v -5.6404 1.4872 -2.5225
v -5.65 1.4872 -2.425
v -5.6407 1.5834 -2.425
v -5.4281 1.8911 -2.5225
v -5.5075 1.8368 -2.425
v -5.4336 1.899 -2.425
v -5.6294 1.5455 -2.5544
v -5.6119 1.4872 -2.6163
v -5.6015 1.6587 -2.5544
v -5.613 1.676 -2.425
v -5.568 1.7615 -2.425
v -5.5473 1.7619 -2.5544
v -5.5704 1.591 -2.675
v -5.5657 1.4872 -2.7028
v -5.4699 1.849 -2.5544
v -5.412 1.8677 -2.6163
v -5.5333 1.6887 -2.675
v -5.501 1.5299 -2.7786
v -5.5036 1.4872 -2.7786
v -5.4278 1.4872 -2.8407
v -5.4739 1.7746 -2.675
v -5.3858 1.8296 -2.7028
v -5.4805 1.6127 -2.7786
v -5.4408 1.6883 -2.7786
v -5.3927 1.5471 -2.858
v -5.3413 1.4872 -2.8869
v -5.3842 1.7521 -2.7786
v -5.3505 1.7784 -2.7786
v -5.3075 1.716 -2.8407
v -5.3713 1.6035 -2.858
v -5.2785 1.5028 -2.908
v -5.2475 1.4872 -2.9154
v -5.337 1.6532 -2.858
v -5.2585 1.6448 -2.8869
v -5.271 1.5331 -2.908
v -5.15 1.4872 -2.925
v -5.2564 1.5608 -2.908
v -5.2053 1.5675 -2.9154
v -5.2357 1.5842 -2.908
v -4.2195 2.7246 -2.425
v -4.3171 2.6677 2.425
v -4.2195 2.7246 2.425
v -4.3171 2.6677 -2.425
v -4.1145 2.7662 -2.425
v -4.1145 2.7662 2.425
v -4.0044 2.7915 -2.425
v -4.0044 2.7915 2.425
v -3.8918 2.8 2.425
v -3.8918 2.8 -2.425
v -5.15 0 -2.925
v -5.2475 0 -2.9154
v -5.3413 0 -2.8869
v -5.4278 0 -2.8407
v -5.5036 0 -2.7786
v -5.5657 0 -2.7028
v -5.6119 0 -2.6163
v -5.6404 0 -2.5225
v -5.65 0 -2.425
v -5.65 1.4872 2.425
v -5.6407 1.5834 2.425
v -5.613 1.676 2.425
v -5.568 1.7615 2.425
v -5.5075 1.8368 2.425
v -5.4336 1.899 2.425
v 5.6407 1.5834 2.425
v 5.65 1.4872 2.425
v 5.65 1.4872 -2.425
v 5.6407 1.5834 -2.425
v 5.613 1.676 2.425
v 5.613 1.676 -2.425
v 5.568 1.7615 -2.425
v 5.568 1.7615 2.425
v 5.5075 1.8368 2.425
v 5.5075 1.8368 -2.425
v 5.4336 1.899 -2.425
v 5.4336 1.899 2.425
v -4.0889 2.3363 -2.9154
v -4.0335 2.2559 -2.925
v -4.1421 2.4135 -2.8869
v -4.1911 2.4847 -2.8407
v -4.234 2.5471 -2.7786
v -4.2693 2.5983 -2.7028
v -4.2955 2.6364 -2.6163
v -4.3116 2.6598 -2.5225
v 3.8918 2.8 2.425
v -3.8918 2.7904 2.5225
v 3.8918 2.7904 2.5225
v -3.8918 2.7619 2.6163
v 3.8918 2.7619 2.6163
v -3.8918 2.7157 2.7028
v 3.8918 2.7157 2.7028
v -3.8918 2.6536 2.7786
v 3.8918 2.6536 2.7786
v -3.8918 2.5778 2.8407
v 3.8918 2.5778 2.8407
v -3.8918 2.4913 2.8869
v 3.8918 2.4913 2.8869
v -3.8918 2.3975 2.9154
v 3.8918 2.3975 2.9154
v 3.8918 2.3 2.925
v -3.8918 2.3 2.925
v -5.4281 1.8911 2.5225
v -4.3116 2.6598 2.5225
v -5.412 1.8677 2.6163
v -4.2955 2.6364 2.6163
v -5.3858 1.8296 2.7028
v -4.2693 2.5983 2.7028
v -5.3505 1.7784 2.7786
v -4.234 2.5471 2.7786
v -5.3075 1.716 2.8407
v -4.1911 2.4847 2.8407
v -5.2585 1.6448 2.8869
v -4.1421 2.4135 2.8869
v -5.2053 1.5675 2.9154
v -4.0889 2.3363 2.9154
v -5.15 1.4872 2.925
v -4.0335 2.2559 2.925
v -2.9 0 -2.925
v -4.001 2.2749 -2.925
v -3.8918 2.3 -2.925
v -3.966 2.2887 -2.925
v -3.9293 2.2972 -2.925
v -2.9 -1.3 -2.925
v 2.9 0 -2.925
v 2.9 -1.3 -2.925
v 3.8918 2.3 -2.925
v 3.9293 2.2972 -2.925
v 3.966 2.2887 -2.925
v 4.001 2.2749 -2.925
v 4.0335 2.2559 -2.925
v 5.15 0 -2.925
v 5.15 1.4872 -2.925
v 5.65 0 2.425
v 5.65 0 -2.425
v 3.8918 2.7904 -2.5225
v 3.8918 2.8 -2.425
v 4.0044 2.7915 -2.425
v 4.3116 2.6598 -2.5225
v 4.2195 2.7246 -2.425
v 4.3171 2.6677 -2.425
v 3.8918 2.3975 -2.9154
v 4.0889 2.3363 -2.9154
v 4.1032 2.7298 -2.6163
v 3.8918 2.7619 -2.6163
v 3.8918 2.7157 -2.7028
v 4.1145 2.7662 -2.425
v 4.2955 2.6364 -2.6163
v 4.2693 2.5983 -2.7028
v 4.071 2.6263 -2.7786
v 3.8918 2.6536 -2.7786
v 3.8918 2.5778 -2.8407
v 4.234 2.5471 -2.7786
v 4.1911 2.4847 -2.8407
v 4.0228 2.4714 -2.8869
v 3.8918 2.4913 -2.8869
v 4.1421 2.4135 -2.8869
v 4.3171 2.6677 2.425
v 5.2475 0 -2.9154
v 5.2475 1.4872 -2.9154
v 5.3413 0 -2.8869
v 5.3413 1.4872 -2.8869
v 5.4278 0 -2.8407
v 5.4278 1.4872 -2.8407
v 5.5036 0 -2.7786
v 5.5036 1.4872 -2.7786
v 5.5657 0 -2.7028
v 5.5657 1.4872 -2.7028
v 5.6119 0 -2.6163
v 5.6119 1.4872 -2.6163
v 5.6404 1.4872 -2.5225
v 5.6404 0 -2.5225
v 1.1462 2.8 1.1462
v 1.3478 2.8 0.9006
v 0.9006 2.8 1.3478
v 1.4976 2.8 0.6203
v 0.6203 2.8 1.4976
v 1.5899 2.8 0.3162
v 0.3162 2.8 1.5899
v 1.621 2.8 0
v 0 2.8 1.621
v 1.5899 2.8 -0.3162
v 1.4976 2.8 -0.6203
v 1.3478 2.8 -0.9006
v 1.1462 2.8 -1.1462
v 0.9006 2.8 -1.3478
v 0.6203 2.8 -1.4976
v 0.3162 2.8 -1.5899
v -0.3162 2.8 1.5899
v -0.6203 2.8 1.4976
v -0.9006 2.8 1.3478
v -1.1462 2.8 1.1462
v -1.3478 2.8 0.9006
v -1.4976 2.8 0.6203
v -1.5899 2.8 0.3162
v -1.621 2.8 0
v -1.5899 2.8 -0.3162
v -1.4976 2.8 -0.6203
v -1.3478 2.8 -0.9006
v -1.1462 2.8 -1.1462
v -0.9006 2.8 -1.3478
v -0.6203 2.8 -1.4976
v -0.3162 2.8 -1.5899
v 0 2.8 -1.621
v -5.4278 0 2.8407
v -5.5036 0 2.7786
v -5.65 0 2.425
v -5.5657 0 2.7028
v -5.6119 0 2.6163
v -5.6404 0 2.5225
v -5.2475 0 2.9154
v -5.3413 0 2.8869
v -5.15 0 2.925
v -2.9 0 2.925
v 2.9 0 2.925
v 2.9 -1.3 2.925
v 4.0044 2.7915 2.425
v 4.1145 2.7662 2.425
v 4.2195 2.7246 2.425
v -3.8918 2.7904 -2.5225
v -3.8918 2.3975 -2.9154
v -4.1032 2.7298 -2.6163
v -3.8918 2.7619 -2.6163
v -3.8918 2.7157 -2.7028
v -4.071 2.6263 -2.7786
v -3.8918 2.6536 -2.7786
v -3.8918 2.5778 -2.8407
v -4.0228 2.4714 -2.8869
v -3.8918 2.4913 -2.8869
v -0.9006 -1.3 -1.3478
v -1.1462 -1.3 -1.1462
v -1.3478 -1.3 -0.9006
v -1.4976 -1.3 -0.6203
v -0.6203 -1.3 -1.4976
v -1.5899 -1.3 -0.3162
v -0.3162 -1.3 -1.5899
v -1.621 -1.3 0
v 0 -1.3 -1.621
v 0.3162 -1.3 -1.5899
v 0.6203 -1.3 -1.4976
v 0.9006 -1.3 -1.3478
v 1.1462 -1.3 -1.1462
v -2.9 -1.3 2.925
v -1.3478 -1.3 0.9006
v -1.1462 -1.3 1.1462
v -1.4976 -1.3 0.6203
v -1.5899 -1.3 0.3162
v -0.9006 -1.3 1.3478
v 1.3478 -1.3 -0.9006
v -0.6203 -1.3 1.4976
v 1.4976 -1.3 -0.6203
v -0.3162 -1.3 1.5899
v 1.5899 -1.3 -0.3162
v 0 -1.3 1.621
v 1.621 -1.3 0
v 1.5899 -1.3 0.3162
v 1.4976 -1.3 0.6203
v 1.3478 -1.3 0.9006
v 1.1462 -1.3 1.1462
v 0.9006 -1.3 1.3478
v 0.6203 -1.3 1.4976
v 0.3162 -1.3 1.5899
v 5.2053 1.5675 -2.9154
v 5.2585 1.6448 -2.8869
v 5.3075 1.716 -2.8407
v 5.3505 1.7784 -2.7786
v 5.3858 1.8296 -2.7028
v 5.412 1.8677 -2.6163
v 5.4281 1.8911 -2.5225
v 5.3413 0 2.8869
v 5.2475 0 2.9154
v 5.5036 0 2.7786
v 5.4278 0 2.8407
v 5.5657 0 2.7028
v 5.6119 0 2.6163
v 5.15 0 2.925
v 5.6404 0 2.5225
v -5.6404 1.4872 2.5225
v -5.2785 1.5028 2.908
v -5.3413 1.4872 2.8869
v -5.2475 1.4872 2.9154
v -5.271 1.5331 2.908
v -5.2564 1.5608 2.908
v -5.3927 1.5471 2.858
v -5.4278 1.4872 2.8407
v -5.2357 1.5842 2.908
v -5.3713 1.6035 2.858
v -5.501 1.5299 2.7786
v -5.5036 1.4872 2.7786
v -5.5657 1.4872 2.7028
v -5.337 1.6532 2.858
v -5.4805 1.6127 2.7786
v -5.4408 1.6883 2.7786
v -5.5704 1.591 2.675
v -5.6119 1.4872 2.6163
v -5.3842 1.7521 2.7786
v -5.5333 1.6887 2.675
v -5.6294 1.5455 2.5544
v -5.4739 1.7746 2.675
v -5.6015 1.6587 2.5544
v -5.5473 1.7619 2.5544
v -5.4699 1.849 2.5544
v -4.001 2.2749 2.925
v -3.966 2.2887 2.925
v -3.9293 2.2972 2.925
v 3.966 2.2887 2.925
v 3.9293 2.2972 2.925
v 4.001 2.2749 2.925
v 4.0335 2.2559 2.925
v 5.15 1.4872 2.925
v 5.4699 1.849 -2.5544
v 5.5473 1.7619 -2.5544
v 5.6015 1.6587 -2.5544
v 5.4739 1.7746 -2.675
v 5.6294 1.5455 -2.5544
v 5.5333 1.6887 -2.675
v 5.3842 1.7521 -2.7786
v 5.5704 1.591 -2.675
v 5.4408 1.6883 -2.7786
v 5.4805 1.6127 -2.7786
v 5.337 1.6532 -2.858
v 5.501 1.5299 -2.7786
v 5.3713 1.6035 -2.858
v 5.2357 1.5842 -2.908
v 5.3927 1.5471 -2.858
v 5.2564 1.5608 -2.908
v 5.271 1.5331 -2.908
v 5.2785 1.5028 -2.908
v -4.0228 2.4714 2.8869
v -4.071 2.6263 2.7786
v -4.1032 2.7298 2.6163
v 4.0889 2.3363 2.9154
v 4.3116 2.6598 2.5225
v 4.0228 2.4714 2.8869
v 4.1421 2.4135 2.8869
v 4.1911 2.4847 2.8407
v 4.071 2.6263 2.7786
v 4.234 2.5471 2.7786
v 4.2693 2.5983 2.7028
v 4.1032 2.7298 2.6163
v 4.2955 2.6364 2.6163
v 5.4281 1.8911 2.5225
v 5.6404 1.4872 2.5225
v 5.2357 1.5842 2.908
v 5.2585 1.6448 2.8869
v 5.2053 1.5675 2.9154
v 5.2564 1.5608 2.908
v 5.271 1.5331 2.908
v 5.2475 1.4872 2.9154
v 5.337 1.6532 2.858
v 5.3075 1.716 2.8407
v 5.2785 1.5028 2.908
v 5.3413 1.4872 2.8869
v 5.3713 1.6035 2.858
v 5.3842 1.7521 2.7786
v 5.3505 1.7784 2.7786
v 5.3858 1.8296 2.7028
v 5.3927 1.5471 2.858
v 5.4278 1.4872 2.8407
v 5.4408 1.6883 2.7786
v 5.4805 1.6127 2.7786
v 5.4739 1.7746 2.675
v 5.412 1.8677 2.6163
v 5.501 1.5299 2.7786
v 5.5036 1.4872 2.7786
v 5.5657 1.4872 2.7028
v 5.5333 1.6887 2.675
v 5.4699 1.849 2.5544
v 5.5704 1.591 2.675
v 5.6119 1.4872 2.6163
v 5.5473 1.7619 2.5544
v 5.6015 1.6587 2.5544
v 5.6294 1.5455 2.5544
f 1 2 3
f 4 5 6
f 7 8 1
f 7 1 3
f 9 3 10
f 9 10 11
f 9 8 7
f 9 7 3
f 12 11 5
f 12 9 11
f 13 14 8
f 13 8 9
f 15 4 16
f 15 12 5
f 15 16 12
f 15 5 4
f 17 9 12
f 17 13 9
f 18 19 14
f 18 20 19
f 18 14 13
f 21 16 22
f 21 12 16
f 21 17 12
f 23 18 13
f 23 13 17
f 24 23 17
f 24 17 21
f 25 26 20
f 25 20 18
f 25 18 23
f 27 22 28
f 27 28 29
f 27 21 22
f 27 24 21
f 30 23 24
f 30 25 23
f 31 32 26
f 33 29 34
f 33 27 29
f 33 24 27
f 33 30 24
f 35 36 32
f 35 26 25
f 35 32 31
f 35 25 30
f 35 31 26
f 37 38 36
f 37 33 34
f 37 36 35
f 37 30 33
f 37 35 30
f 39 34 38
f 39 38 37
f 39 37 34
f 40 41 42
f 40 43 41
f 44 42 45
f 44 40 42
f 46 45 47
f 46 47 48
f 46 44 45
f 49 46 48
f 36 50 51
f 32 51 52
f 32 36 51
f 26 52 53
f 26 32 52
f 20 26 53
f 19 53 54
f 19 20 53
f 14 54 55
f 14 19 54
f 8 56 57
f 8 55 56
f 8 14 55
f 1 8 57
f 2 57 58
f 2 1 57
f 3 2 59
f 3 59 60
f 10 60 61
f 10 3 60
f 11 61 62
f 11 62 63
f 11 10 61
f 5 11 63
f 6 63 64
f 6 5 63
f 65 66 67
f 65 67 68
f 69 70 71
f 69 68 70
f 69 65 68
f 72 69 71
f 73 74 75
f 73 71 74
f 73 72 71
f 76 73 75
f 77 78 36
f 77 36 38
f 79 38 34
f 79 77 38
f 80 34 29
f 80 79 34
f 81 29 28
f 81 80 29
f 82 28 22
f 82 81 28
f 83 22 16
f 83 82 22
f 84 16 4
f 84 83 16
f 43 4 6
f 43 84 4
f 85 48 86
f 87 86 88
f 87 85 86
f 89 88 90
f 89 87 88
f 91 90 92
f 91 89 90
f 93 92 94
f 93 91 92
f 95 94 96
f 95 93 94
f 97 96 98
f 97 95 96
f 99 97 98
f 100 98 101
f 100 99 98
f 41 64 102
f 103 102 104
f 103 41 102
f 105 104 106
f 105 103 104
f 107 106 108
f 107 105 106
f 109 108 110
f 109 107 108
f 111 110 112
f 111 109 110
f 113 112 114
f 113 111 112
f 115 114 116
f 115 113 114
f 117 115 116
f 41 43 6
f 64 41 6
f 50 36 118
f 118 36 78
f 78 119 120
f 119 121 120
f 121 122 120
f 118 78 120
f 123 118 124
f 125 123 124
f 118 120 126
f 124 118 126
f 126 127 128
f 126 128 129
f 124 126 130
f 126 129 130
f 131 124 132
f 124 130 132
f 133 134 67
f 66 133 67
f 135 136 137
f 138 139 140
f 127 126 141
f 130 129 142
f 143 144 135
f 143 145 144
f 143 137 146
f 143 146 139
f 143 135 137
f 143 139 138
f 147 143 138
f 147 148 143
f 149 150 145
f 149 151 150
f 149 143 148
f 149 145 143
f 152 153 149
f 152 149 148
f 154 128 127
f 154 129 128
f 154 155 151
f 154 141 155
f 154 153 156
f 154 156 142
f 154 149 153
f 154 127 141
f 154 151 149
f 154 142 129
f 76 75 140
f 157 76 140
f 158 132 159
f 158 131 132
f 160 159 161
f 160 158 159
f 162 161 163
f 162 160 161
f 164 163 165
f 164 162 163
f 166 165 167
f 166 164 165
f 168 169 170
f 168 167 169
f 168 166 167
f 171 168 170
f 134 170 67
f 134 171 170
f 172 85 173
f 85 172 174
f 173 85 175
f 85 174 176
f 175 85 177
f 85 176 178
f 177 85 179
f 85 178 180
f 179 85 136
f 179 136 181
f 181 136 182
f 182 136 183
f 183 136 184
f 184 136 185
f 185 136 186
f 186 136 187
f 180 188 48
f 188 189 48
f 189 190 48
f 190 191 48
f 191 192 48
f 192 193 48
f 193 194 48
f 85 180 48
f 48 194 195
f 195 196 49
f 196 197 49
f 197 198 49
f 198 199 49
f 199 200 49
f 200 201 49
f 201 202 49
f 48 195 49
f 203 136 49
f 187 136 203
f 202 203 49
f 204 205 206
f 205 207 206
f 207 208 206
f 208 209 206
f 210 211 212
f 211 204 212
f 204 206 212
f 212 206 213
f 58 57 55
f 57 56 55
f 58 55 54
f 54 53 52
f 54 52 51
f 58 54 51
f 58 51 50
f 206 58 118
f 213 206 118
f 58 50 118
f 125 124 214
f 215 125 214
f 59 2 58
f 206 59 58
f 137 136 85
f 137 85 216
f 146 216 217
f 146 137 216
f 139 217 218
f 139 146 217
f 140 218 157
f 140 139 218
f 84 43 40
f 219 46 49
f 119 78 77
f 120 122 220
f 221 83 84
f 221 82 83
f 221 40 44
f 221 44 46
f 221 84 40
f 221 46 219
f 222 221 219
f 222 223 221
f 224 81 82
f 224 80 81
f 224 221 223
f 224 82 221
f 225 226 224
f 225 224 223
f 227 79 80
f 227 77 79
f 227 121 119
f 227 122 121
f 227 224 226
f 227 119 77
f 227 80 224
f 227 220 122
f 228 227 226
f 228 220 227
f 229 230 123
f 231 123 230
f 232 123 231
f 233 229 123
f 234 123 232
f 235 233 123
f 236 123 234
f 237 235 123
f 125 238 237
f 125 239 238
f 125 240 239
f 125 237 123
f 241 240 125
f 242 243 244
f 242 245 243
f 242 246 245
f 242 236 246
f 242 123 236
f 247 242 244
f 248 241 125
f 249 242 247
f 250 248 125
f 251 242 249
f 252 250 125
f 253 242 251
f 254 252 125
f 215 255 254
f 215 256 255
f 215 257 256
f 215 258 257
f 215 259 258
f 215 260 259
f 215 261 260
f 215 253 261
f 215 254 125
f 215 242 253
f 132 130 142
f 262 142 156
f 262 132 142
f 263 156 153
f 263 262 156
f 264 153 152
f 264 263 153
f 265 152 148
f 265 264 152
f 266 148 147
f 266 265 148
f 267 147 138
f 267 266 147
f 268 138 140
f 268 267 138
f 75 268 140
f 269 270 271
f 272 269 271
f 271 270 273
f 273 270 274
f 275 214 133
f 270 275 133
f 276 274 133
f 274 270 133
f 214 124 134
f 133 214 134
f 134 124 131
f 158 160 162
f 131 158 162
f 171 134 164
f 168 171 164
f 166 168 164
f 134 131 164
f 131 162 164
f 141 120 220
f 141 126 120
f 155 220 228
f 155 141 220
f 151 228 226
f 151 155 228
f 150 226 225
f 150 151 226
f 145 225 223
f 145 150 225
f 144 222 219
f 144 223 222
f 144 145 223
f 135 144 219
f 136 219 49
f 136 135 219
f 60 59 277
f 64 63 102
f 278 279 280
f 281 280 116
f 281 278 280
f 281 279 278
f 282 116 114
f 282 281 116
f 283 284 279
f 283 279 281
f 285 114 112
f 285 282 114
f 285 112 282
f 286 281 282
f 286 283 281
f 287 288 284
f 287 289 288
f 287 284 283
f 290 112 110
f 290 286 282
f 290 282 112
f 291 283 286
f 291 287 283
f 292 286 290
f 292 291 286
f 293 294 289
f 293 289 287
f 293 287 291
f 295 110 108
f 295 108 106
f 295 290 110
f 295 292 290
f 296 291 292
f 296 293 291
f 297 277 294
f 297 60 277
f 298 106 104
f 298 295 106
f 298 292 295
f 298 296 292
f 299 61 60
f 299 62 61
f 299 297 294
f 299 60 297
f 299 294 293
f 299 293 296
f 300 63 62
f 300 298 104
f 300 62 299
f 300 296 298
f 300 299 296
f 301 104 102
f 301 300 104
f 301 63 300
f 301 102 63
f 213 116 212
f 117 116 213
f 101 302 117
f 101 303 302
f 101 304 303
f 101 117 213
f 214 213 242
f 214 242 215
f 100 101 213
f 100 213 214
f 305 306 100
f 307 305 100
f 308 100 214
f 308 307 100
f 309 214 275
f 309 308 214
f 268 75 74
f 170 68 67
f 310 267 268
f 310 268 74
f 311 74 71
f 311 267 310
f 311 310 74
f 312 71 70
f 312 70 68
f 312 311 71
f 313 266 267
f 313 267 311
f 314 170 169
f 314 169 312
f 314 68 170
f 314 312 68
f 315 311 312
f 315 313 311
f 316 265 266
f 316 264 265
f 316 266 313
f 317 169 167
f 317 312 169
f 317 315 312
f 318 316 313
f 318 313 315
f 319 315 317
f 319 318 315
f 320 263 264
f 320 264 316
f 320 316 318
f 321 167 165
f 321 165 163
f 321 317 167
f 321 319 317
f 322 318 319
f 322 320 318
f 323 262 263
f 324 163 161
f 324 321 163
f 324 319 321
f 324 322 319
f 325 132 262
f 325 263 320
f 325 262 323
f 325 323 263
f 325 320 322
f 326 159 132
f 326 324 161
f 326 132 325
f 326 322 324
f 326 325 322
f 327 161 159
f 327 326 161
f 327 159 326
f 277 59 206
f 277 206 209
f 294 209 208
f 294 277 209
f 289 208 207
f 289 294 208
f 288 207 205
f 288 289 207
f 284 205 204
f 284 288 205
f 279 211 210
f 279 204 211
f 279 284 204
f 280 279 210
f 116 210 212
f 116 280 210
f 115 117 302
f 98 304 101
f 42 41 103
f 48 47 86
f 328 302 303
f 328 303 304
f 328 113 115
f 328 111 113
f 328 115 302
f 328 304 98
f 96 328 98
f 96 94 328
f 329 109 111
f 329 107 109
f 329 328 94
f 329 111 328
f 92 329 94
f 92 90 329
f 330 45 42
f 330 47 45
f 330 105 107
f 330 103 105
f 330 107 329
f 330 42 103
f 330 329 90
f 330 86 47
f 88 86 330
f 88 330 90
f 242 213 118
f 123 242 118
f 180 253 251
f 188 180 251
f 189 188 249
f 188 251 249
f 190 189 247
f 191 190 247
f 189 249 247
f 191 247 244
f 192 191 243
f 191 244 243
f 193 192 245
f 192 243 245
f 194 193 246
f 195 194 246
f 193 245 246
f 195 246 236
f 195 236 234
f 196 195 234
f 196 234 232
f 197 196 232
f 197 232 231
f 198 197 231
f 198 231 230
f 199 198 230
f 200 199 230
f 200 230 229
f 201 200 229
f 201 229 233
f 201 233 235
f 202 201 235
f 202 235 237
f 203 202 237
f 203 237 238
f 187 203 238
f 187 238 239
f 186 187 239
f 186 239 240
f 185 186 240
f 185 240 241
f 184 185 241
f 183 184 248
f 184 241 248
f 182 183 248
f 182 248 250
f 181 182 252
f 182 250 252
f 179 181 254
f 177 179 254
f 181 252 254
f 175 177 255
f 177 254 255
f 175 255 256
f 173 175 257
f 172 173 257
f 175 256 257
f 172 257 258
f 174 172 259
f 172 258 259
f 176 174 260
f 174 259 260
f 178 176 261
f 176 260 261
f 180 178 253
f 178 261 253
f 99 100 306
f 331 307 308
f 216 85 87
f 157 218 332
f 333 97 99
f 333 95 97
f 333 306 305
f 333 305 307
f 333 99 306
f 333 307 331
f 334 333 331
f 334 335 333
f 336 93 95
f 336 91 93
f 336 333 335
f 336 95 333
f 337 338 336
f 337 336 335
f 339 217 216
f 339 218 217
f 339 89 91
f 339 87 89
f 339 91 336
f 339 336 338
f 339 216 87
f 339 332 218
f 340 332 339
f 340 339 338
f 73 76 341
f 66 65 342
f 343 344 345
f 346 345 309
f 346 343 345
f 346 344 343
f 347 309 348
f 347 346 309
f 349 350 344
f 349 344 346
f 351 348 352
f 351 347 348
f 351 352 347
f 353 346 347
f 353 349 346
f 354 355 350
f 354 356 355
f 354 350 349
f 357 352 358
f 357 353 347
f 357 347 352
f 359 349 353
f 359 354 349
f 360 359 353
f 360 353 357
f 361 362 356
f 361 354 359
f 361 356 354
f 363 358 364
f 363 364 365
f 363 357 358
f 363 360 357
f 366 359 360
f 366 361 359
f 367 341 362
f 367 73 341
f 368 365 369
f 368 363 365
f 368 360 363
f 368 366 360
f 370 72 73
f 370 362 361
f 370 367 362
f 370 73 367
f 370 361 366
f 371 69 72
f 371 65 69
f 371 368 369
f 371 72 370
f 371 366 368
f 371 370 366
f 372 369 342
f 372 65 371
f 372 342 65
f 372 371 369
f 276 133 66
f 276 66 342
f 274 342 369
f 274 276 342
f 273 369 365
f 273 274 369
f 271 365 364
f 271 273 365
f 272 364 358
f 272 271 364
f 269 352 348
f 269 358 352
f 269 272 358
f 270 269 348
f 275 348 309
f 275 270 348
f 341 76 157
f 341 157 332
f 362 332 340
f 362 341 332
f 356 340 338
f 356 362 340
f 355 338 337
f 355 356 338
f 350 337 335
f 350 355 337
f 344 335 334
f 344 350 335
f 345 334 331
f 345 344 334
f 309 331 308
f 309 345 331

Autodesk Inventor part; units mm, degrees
ref_plane "YZ Plane" through (0, 0, 0) normal (1, 0, 0) x (0, 1, 0)
ref_plane "XZ Plane" through (0, 0, 0) normal (0, 1, 0) x (-1, 0, 0)
ref_plane "XY Plane" through (0, 0, 0) normal (0, 0, 1) x (1, 0, 0)
sketch "Esquisse1" plane through (0, 0, 0) normal (0, 0, 1) x (1, 0, 0)
  line L0 (-5.65, 0) -> (5.65, 0)
  line L1 (5.65, 0) -> (5.65, 1.75)
  line L2 (5.65, 1.75) -> (4.125, 2.8)
  line L3 (4.125, 2.8) -> (-4.125, 2.8)
  line L4 (-4.125, 2.8) -> (-5.65, 1.75)
  line L5 (-5.65, 1.75) -> (-5.65, 0)
  point P0 (0, 0)
  dimension "d0" = 11.3
  dimension "d1" = 2.8
  dimension "d2" = 8.25
  dimension "d3" = 5.65
  dimension "d4" = 1.75
extrude "Extrusion1" add sketch "Esquisse1" along normal mid plane 5.85
sketch "Esquisse2" plane through (-5.65, 0, 2.925) normal (0, -1, 0) x (1, 0, 0)
  line L0 (2.75, -5.85) -> (8.55, -5.85)
  line L1 (8.55, -5.85) -> (8.55, 0)
  line L2 (8.55, 0) -> (2.75, 0)
  line L3 (2.75, 0) -> (2.75, -5.85)
  line L4 (2.75, -5.85) -> (8.55, 0) construction
  line L5 (8.55, -5.85) -> (2.75, 0) construction
  line L6 (0, 0) -> (11.3, 0) projected
  point P0 (5.65, -2.925)
  dimension "d7" = 5.8
extrude "Extrusion2" add sketch "Esquisse2" along normal blind 1.3
sketch "Esquisse3" plane through (-4.125, 2.8, 2.925) normal (0, 1, 0) x (1, 0, 0)
  point P0 (4.125, 2.925)
  point P1 (4.125, 2.925)
hole "Perçage1" at (0, 2.8, 0) direction (0, -1, 0) diameter 3.242 depth 11.8 tip angle 118 thread size "M4x0.7" class "6H" standard "ISO Metric profile"
fillet "Congé1" radius 0.5 2 edges at (-5.65, 1.75, 0) (5.65, 1.75, 0)
fillet "Congé2" radius 0.75 2 edges at (4.125, 2.8, 0) (-4.125, 2.8, 0)
fillet "Congé3" radius 0.5 18 edges at (-5.5926, 1.7198, 2.925) (-5.65, 0.7436, 2.925) (-4.1145, 2.7662, 2.925) (0, 2.8, 2.925) (4.1145, 2.7662, 2.925) (4.8753, 2.2834, 2.925) (5.5926, 1.7198, 2.925) (5.65, 0.7436, 2.925) (-4.8753, 2.2834, 2.925) (-4.1145, 2.7662, -2.925) (0, 2.8, -2.925) (4.1145, 2.7662, -2.925) (4.8753, 2.2834, -2.925) (5.5926, 1.7198, -2.925) (5.65, 0.7436, -2.925) (-5.5926, 1.7198, -2.925) (-5.65, 0.7436, -2.925) (-4.8753, 2.2834, -2.925)
equation "\"d3\" = 0.5 * d0"
properties part number "Noix M4" material "Acier"
